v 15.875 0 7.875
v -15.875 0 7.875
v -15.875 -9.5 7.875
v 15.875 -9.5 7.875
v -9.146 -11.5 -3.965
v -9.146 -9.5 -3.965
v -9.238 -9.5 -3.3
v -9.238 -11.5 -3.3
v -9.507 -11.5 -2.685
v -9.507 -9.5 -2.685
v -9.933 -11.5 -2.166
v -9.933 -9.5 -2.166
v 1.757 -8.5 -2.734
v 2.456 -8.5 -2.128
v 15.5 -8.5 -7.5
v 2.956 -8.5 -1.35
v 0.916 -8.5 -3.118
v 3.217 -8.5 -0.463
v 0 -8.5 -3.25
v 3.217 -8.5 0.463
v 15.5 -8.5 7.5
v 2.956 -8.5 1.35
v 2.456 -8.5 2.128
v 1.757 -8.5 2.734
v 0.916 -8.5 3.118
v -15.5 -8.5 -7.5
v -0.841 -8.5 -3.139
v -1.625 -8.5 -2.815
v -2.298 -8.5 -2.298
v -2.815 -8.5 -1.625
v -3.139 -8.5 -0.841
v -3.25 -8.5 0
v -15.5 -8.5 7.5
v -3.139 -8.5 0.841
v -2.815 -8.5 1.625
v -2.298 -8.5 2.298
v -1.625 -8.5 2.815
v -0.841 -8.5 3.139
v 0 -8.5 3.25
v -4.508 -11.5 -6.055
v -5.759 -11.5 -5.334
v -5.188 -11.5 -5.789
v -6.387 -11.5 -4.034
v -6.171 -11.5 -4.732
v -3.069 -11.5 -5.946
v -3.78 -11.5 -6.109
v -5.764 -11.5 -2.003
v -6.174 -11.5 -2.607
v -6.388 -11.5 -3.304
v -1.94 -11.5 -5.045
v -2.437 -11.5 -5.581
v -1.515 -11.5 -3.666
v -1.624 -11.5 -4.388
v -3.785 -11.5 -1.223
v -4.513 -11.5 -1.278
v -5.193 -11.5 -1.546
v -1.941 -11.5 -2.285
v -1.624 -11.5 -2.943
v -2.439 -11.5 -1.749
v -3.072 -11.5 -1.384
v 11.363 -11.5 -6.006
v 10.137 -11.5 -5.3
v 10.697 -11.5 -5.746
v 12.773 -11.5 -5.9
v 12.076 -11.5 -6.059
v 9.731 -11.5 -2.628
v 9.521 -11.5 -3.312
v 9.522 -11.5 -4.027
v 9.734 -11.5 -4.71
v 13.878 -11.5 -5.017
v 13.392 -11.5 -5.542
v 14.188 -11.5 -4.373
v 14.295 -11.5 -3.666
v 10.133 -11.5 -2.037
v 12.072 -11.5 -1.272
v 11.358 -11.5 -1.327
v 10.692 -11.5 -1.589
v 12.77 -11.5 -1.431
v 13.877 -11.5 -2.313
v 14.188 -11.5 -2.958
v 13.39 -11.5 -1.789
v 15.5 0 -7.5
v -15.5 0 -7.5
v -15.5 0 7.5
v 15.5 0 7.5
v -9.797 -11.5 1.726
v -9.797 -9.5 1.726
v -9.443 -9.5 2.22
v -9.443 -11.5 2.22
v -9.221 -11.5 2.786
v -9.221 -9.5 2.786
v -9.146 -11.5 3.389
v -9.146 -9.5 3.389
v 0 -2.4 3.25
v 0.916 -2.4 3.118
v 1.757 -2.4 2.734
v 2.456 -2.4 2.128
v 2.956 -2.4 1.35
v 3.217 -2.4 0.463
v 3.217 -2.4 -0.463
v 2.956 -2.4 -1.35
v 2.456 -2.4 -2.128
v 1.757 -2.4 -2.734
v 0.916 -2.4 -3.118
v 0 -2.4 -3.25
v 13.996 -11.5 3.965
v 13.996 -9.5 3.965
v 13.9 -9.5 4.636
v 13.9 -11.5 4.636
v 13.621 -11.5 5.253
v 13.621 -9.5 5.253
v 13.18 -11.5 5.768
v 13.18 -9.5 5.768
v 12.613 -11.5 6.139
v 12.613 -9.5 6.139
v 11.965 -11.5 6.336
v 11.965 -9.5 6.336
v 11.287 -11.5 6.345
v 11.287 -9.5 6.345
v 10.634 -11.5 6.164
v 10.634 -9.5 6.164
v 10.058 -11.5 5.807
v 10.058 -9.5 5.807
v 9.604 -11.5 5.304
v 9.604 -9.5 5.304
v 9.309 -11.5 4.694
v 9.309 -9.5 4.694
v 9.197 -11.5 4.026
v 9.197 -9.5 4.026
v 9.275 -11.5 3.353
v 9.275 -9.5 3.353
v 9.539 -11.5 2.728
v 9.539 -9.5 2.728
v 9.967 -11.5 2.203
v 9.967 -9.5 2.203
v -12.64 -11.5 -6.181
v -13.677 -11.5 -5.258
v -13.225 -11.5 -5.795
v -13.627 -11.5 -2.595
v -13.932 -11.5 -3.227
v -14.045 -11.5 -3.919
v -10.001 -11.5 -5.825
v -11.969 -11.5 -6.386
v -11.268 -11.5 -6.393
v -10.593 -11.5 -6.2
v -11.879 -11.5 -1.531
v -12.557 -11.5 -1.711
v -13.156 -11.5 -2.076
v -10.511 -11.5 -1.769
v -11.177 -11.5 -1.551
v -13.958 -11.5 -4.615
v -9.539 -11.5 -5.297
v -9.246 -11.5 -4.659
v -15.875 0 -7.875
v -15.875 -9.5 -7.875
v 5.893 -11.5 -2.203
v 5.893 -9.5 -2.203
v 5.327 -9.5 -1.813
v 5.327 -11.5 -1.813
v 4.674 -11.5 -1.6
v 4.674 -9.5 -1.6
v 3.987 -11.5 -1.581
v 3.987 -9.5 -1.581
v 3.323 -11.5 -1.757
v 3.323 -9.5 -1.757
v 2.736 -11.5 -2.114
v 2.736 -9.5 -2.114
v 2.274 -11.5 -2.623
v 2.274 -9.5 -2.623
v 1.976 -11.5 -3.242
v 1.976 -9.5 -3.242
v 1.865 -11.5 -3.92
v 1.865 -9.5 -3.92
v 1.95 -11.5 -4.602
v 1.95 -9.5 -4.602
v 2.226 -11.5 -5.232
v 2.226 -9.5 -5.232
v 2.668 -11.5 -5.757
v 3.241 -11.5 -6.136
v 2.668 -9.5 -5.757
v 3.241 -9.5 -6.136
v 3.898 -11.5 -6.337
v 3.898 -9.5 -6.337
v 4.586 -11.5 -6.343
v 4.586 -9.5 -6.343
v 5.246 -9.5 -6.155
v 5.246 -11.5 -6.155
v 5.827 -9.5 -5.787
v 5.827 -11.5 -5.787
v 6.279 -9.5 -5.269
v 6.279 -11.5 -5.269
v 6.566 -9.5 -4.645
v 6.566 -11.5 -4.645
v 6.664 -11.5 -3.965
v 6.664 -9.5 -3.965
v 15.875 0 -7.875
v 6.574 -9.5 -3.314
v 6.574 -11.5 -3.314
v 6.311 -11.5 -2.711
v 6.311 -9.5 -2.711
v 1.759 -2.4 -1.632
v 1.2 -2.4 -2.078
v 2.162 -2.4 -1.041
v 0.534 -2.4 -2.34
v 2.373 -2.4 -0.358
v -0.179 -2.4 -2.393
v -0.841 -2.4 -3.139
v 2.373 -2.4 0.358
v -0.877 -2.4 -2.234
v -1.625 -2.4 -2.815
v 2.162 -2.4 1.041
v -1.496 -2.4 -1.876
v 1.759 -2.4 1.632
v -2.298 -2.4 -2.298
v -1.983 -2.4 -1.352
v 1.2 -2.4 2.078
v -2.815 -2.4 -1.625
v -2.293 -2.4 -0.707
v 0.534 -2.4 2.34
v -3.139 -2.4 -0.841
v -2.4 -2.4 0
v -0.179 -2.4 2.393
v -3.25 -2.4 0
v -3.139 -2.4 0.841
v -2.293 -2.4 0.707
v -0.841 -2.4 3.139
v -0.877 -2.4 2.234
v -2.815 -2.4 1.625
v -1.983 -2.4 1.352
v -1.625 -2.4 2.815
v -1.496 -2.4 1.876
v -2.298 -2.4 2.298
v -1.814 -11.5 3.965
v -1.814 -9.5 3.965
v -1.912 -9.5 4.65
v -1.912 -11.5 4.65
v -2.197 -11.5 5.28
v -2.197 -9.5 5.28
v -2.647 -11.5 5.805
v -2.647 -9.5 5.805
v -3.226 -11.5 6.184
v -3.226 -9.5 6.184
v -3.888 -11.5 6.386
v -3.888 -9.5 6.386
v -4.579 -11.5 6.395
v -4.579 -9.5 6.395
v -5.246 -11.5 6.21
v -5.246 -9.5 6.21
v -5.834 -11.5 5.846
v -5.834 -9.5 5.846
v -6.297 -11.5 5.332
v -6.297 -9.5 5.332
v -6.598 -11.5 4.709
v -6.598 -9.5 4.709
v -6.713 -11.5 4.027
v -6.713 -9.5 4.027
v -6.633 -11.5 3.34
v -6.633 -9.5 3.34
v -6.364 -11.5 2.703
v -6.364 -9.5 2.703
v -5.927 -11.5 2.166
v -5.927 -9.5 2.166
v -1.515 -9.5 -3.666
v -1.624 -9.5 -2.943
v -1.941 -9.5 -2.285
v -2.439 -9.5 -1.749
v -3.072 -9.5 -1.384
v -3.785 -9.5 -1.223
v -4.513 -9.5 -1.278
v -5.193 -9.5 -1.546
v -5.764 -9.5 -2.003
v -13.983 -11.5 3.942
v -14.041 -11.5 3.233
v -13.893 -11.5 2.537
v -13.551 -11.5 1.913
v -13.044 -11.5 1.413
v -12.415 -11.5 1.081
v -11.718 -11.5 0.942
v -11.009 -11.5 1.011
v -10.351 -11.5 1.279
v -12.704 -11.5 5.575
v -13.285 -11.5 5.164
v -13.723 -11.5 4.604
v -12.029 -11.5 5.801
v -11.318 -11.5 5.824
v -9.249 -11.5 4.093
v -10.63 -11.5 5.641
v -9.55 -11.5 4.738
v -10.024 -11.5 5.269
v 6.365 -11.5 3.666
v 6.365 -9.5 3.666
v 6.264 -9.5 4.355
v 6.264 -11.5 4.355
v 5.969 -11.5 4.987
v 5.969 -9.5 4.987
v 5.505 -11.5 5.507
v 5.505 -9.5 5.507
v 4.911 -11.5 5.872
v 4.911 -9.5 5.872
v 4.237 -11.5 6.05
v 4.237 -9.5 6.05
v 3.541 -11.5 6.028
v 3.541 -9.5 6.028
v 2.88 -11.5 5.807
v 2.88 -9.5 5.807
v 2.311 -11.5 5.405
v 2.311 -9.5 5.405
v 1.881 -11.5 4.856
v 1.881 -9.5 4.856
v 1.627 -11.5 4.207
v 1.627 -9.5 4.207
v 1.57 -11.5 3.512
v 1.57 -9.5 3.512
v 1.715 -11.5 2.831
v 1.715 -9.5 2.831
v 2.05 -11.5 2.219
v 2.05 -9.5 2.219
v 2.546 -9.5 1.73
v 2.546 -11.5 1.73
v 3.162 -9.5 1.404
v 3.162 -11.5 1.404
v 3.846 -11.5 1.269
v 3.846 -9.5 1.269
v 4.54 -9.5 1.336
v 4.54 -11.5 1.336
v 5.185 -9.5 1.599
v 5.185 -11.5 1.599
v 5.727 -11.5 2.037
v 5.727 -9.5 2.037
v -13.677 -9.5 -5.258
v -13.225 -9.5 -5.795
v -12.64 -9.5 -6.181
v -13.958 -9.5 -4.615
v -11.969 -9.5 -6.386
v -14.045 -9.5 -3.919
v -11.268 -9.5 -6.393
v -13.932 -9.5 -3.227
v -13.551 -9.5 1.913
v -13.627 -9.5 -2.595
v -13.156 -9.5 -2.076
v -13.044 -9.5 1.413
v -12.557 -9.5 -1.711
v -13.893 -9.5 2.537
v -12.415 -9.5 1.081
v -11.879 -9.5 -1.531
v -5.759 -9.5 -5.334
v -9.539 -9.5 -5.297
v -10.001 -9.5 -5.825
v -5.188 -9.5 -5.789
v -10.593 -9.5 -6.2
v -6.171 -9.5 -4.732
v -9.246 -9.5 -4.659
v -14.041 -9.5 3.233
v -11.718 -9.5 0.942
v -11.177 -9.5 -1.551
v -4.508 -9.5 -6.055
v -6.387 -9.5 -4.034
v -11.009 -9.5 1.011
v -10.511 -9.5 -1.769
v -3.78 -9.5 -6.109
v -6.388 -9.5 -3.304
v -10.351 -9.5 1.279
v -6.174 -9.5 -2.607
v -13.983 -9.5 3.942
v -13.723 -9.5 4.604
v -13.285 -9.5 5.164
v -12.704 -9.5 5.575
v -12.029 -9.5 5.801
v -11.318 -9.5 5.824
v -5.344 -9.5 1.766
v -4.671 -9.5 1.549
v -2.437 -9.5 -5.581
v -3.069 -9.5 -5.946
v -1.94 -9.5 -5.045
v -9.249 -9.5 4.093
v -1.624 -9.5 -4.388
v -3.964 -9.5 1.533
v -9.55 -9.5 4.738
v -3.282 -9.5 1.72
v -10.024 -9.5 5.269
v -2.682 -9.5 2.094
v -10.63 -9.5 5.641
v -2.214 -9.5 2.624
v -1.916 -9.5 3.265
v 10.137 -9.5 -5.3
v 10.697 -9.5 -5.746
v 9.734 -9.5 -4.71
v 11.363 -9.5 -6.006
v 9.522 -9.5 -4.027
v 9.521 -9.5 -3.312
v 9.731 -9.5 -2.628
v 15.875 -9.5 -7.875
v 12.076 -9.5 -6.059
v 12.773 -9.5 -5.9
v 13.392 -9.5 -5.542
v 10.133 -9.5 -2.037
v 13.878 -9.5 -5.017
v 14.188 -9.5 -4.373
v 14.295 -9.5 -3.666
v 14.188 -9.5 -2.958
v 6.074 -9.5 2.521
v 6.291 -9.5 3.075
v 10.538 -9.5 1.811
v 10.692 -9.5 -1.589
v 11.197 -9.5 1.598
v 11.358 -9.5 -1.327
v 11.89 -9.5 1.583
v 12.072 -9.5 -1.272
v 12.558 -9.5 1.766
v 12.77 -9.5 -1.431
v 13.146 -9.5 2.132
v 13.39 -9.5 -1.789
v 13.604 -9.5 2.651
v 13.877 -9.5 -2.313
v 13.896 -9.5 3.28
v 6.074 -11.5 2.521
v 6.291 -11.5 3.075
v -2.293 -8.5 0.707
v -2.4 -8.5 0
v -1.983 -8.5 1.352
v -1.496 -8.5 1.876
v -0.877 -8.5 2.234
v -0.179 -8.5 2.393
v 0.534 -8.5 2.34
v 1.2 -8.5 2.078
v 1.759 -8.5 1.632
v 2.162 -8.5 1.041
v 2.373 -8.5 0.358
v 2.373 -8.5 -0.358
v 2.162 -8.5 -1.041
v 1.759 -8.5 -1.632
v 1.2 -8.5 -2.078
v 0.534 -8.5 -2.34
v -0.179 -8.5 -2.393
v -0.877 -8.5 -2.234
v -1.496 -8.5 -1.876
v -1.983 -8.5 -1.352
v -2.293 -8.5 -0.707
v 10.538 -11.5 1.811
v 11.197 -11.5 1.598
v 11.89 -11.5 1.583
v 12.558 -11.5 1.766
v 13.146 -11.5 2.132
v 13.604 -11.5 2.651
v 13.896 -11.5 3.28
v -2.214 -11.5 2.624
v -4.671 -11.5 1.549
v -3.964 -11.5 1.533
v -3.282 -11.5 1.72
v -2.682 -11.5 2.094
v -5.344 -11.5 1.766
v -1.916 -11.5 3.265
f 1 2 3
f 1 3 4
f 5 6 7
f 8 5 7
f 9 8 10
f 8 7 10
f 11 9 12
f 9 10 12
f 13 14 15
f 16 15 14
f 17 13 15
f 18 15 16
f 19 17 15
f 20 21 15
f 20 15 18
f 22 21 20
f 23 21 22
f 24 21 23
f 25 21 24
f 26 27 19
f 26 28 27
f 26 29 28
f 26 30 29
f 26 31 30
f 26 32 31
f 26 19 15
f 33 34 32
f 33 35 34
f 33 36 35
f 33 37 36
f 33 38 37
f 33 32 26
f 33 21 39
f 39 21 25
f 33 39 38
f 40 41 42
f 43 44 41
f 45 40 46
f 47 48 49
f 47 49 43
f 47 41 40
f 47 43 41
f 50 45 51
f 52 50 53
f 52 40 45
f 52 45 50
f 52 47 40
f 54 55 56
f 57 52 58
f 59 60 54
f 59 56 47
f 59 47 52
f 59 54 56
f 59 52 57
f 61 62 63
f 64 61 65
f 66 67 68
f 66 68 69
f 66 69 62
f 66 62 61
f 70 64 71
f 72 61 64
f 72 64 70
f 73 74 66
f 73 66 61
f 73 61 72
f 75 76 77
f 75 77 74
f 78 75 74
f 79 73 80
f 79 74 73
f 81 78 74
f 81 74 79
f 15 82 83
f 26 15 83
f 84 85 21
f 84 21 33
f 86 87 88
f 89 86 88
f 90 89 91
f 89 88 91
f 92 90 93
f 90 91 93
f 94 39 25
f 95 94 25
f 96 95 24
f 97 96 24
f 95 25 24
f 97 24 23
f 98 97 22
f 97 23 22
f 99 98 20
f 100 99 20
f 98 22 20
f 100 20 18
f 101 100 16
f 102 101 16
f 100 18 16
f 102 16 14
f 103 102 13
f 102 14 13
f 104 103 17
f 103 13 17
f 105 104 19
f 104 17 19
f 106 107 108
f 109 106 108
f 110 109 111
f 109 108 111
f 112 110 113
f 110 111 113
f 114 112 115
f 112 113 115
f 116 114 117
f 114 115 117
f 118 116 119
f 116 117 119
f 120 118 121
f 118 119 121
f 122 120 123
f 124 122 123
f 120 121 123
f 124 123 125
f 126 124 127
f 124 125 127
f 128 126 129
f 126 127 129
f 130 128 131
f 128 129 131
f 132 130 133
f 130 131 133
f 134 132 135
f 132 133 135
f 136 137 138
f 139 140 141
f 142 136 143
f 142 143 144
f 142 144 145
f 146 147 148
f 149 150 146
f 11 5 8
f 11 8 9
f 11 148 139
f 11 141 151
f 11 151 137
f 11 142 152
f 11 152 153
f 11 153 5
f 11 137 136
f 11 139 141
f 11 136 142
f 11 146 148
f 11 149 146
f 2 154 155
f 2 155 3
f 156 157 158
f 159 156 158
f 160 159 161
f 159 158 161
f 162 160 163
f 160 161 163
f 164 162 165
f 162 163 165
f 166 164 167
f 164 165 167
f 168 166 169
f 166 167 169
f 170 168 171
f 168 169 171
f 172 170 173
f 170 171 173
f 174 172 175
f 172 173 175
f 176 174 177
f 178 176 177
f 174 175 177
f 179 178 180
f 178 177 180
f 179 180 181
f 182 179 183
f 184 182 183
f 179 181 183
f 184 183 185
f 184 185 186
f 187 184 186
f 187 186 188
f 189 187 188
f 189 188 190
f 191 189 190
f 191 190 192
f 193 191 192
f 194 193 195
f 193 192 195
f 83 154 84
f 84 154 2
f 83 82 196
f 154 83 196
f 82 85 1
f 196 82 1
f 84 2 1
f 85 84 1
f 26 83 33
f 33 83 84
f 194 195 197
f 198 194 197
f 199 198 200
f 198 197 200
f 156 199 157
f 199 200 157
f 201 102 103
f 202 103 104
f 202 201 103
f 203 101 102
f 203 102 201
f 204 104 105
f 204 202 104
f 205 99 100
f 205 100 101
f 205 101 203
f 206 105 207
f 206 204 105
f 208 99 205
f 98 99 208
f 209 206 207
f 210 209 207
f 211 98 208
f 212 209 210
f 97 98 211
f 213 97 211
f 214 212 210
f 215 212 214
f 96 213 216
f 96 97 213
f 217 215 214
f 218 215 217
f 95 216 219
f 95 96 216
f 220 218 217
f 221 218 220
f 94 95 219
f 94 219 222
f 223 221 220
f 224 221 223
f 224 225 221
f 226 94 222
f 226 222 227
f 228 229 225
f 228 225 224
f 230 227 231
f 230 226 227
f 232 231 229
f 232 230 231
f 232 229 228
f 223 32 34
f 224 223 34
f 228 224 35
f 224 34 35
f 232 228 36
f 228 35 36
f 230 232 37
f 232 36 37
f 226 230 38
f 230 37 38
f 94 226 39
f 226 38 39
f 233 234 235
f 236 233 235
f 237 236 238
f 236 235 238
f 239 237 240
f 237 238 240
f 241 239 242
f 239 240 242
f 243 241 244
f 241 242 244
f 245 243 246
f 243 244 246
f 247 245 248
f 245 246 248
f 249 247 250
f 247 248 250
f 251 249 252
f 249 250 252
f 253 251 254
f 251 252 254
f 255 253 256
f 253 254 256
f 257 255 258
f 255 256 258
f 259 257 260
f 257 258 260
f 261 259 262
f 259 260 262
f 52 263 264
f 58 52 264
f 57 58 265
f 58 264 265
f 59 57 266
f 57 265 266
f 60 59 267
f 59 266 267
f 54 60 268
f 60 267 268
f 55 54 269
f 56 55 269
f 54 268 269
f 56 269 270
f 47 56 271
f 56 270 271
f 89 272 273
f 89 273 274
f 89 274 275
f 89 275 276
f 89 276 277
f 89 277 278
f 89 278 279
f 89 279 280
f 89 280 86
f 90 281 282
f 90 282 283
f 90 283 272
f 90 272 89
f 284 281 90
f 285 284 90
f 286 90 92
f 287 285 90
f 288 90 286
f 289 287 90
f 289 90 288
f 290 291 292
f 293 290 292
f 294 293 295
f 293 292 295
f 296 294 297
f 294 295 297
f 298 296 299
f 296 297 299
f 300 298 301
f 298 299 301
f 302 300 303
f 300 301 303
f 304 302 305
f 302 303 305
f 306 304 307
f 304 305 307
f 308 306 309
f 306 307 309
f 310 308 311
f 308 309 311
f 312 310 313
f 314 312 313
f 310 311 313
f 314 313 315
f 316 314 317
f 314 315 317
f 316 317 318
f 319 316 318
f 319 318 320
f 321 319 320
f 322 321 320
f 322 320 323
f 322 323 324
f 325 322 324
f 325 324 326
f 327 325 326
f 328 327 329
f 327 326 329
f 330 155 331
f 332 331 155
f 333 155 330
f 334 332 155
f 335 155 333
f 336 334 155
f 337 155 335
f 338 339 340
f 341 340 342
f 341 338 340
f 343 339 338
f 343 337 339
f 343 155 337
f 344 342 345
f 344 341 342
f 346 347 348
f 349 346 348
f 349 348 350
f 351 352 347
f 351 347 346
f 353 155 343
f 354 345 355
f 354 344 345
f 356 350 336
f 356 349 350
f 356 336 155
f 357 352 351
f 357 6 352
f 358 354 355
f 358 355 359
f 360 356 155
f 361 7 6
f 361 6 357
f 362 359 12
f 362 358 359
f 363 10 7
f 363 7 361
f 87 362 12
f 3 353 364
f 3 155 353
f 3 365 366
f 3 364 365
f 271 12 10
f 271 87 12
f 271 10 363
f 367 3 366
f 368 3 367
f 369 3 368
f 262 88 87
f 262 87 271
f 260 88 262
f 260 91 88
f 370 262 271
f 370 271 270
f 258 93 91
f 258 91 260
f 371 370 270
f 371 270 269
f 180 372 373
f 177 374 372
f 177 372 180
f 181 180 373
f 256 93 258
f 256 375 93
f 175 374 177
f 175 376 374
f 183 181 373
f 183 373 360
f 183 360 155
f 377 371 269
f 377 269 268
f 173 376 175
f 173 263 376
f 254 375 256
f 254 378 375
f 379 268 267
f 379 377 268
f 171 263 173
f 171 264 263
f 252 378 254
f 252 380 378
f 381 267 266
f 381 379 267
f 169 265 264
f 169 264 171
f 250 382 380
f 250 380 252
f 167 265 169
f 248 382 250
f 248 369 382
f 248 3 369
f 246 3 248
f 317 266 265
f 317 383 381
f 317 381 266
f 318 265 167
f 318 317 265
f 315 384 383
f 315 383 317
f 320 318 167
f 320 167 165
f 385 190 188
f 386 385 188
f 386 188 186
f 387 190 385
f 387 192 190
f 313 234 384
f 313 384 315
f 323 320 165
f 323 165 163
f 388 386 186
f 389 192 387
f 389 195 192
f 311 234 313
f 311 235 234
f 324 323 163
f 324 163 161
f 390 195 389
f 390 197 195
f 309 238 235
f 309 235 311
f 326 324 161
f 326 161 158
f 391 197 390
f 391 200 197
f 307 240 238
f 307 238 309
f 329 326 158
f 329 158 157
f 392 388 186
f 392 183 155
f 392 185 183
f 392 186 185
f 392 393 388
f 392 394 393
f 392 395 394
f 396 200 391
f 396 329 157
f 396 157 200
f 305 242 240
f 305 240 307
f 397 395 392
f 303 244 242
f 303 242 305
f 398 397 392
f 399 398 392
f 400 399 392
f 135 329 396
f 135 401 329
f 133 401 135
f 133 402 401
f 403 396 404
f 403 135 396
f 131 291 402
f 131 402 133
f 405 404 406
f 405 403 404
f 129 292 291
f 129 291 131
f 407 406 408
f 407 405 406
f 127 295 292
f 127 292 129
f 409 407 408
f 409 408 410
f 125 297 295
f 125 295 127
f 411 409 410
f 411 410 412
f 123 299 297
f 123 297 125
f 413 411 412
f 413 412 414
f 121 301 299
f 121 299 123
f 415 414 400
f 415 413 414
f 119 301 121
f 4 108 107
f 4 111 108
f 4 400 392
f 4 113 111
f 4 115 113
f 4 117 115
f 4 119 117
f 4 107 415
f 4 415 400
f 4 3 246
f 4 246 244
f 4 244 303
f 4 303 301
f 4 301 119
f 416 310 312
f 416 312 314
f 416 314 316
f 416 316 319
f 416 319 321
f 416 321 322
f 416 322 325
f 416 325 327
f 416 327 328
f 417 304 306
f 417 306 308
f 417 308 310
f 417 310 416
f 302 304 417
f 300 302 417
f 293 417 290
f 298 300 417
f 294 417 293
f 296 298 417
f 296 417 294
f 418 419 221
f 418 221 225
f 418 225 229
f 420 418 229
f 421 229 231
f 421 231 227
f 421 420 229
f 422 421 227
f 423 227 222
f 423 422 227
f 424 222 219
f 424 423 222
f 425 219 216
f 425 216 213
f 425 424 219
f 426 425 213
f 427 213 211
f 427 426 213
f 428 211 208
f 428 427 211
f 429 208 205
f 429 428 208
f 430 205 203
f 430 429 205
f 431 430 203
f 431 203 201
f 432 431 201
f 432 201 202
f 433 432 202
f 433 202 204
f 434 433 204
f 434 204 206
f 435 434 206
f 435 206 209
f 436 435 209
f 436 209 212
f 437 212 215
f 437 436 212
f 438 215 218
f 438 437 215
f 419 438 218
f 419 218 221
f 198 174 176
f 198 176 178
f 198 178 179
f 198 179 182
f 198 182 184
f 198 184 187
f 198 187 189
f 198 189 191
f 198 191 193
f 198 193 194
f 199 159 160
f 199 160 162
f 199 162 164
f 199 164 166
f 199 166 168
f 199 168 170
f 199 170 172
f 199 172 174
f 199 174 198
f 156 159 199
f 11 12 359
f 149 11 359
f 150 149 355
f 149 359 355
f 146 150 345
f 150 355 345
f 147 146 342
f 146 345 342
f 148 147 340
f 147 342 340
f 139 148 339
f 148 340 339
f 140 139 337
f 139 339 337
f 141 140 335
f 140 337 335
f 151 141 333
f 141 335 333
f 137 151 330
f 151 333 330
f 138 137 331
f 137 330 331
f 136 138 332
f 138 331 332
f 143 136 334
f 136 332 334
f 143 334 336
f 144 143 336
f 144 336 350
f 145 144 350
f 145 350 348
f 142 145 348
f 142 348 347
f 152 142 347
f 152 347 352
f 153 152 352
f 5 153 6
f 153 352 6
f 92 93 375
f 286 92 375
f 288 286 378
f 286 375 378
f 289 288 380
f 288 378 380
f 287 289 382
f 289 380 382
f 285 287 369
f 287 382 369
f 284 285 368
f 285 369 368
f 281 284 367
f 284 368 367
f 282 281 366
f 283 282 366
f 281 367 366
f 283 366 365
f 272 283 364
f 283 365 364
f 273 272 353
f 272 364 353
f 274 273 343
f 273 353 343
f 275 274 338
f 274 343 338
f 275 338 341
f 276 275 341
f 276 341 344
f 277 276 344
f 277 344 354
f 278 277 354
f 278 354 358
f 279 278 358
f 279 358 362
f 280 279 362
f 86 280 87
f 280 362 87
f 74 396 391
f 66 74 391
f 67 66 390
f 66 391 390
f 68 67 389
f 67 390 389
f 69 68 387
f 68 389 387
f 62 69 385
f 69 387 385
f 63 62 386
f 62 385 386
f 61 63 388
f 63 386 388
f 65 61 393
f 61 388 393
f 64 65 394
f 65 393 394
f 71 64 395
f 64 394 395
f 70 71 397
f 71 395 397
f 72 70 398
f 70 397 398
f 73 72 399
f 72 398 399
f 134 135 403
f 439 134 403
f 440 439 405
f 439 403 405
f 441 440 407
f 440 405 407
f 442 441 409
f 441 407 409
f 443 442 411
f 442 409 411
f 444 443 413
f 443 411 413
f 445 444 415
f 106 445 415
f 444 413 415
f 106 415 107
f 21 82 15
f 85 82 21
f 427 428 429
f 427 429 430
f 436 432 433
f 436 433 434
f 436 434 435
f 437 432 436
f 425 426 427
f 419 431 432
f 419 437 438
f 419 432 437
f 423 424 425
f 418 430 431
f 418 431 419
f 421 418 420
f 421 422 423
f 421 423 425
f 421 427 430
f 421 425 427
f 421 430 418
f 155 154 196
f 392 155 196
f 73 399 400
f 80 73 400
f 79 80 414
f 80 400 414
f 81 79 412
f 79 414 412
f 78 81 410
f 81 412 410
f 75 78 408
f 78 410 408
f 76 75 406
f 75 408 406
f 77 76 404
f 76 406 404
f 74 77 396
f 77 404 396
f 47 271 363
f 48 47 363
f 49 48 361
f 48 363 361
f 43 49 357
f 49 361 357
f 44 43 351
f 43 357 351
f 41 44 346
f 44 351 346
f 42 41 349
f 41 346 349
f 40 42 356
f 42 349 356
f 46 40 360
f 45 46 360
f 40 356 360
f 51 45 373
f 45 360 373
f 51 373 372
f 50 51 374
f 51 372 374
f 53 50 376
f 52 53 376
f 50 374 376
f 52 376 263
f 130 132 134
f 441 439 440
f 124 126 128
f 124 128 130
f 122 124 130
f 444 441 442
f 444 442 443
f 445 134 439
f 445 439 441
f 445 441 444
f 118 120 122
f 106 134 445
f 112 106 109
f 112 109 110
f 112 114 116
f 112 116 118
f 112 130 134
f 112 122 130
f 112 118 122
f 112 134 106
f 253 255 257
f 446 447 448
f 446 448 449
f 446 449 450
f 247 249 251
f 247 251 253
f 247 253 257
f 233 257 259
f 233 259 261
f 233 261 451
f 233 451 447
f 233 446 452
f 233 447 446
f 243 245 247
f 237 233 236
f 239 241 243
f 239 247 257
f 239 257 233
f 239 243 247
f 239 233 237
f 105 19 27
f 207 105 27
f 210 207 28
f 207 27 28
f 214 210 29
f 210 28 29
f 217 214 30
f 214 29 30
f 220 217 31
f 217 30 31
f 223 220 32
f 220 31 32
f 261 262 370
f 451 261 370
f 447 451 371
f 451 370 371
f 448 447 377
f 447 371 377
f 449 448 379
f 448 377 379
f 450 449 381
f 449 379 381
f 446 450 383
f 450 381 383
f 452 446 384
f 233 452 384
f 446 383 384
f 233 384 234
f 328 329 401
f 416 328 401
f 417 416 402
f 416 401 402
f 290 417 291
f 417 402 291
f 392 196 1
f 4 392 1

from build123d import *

# Parameters (mm, degrees)
F0_W     = 31.75
F0_H     = 15.75
F1_DEPTH = 9.5
F2_W     = 31
F2_H     = 15
F3_DEPTH = 8.5
F5_DEPTH = 2
F6_R     = 2.4
F7_DEPTH = 6.1


with BuildPart() as f1:
    # F0 (on Front) → F1 (new body)
    with BuildSketch(Plane.XZ):
        Rectangle(F0_W, F0_H)
    extrude(amount=F1_DEPTH)

    # F2 (on face) → F3 (cut)
    with BuildSketch(Plane(origin=(0, 0, 0), x_dir=(-1, 0, 0), z_dir=(0, 1, 0))):
        Rectangle(F2_W, F2_H)
    extrude(amount=-F3_DEPTH, mode=Mode.SUBTRACT)

    # F4 (on face) → F5 (join)
    with BuildSketch(Plane.XZ.offset(9.5)):
        with BuildLine():
            ThreePointArc((-1.515, -3.665893), (-3.071941, -1.384458), (-5.763935, -2.002664))
            ThreePointArc((-5.763935, -2.002664), (-4.858059, -5.947328), (-1.515, -3.665893))
        make_face()
        with BuildLine():
            ThreePointArc((-9.145893, -3.965), (-9.351187, -2.98327), (-9.932664, -2.166065))
            ThreePointArc((-9.932664, -2.166065), (-13.8406, -4.94673), (-9.145893, -3.965))
        make_face()
        with BuildLine():
            ThreePointArc((-9.145893, 3.389351), (-13.877328, 4.28241), (-9.796958, 1.726121))
            ThreePointArc((-9.796958, 1.726121), (-9.314458, 2.496292), (-9.145893, 3.389351))
        make_face()
        with BuildLine():
            ThreePointArc((-1.814107, 3.965), (-5.245837, 6.209706), (-5.927336, 2.166065))
            ThreePointArc((-5.927336, 2.166065), (-3.282376, 1.720294), (-1.814107, 3.965))
        make_face()
        with BuildLine():
            ThreePointArc((6.365, 3.665893), (1.730125, 4.540727), (5.727222, 2.036607))
            ThreePointArc((5.727222, 2.036607), (6.199875, 2.79106), (6.365, 3.665893))
        make_face()
        with BuildLine():
            ThreePointArc((13.995893, 3.965), (10.634199, 6.163896), (9.966607, 2.202778))
            ThreePointArc((9.966607, 2.202778), (12.557588, 1.766104), (13.995893, 3.965))
        make_face()
        with BuildLine():
            ThreePointArc((14.295, -3.665893), (12.769833, -1.431018), (10.132778, -2.036607))
            ThreePointArc((10.132778, -2.036607), (11.020167, -5.900769), (14.295, -3.665893))
        make_face()
        with BuildLine():
            ThreePointArc((6.664107, -3.965), (6.463002, -3.003305), (5.893393, -2.202778))
            ThreePointArc((5.893393, -2.202778), (2.065211, -4.926695), (6.664107, -3.965))
        make_face()
    extrude(amount=F5_DEPTH)

    # F6 (on face) → F7 (join)
    with BuildSketch(Plane(origin=(0, -8.5, 0), x_dir=(-1, 0, 0), z_dir=(0, 1, 0))):
        with BuildLine():
            ThreePointArc((0, -3.25), (2.298097, -2.298097), (3.25, 0))
            ThreePointArc((3.25, 0), (2.298097, 2.298097), (0, 3.25))
            ThreePointArc((0, 3.25), (-3.25, 0), (0, -3.25))
        make_face()
        Circle(F6_R, mode=Mode.SUBTRACT)
    extrude(amount=F7_DEPTH)


solid = f1.part
